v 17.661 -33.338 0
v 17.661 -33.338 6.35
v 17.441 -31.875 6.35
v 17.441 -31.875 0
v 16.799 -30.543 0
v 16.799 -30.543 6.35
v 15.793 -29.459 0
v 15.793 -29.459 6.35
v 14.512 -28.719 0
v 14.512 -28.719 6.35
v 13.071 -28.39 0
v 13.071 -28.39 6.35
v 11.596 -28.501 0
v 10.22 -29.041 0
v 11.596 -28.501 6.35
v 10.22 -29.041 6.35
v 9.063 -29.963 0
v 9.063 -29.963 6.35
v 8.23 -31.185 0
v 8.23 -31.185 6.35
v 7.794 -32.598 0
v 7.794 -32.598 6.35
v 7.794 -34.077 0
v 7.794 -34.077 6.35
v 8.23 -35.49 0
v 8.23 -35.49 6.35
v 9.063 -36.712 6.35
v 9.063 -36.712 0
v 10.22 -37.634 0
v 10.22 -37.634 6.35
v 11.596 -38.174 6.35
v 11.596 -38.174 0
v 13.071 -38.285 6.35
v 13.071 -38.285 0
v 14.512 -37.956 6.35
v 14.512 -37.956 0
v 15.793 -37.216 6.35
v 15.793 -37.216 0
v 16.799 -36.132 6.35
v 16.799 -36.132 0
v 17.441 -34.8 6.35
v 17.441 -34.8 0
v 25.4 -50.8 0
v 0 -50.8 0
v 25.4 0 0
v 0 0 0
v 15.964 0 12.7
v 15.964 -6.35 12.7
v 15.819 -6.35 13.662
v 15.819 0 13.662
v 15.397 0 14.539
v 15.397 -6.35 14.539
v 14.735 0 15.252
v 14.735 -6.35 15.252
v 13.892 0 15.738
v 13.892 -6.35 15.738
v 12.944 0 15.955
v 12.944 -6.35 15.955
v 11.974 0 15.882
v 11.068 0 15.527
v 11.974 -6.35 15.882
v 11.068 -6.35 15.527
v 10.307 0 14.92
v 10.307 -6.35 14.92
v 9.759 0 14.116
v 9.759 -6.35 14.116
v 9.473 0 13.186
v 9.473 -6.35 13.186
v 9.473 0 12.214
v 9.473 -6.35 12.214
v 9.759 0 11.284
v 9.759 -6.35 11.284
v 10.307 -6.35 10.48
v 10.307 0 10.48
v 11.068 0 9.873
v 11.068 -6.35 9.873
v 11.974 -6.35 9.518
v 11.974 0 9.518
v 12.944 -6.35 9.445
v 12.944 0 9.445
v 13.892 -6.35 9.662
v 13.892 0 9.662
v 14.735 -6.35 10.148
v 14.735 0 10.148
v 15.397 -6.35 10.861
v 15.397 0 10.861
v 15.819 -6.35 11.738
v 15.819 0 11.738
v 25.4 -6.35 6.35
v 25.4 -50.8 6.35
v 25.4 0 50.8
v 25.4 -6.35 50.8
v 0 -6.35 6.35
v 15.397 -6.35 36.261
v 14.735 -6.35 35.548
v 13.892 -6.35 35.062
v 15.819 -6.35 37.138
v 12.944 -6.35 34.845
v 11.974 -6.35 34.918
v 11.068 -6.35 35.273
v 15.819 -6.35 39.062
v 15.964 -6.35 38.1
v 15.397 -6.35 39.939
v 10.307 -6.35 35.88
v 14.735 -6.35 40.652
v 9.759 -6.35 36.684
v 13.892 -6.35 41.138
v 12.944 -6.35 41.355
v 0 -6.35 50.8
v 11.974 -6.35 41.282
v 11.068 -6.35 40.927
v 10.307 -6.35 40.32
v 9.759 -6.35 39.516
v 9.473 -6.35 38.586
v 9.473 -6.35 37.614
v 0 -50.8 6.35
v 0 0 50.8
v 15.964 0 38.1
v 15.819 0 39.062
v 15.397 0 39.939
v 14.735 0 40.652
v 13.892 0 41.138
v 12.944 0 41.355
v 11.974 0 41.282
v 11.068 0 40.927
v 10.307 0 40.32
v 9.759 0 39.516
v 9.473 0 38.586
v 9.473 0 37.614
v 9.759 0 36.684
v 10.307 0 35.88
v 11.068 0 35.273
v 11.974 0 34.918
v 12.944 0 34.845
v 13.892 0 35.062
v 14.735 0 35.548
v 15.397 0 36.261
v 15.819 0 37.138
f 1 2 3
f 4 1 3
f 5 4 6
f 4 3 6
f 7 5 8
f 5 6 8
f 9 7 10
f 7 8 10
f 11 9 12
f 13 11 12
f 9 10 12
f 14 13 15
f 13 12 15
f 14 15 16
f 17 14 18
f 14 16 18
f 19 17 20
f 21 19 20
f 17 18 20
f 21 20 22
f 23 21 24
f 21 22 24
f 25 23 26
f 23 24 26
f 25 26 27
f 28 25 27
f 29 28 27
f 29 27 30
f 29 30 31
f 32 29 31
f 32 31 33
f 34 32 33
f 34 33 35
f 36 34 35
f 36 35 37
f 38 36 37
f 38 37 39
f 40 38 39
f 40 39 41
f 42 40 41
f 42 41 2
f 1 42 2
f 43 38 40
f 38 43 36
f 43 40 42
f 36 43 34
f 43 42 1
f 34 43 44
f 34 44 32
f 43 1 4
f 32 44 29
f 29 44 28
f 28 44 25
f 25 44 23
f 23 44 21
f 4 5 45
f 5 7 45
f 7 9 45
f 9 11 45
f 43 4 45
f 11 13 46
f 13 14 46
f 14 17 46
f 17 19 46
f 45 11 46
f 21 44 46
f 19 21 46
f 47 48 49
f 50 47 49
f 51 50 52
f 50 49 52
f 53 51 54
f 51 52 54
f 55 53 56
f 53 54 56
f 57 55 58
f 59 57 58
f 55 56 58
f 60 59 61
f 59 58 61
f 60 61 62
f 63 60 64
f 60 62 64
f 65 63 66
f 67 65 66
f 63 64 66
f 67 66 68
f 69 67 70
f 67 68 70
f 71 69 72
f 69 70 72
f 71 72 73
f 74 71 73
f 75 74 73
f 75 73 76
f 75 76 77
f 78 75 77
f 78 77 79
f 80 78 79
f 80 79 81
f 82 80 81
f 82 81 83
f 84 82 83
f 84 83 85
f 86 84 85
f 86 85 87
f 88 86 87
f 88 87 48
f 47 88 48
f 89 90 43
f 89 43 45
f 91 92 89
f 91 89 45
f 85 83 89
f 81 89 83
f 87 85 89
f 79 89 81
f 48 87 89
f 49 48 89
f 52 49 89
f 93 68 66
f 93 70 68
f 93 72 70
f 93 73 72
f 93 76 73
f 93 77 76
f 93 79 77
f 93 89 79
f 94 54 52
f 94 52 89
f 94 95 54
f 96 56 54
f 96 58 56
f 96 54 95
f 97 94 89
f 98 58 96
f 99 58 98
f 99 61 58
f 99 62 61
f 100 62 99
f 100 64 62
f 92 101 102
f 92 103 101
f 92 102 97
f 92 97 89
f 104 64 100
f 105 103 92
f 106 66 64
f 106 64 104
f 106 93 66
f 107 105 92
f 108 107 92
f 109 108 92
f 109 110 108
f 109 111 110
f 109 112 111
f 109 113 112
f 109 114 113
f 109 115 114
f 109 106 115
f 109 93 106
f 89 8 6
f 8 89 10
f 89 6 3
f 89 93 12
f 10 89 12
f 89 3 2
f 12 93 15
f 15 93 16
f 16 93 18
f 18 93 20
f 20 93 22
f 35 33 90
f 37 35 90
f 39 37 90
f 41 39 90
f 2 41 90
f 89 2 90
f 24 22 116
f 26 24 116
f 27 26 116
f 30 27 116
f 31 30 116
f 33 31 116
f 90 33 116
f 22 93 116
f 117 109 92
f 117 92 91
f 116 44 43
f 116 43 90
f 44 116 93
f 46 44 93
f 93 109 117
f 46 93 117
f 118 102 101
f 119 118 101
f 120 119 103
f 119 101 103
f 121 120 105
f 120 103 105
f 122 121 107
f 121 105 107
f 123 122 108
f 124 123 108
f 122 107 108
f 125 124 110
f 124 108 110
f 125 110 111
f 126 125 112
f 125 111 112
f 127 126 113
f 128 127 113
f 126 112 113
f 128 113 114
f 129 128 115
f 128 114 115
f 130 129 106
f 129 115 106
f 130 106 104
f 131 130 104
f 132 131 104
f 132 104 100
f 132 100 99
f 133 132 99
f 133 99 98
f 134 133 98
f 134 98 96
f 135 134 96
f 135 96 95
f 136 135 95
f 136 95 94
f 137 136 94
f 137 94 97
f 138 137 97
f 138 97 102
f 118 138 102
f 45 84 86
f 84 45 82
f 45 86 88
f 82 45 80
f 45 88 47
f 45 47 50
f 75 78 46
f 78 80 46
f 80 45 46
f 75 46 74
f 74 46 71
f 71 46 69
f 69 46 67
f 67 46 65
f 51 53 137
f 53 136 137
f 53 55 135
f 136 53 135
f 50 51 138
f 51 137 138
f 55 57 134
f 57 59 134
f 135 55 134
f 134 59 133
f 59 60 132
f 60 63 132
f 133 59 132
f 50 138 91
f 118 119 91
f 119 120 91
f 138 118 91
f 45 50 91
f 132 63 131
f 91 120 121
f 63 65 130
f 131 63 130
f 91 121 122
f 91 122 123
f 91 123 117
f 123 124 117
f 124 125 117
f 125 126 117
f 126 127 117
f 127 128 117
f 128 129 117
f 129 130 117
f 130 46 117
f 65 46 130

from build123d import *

# Parameters (mm, degrees)
F0_W     = 44.45
F0_H     = 6.35
F0_W_2   = 6.35
F0_H_2   = 44.45
F1_DEPTH = 25.4
F2_R     = 4.960938
F3_DEPTH = 25.4
F5_R     = 3.2639
F6_DEPTH = 25.4


with BuildPart() as f1:
    # F0 (on Right) → F1 (new body)
    with BuildSketch(Plane.YZ):
        with Locations((-28.575, 3.175)):
            Rectangle(F0_W, F0_H)
        with Locations((-3.175, 3.175)):
            Rectangle(F0_W_2, F0_H)
        with Locations((-3.175, 28.575)):
            Rectangle(F0_W_2, F0_H_2)
    extrude(amount=F1_DEPTH)

    # F2 (on face) → F3 (cut)
    with BuildSketch(Plane.XY.offset(6.35)):
        with Locations((12.7, -33.3375)):
            Circle(F2_R)
    extrude(amount=-F3_DEPTH, mode=Mode.SUBTRACT)

    # F5 (on face) → F6 (cut)
    with BuildSketch(Plane.XZ.offset(6.35)):
        with Locations((12.7, 12.7)):
            Circle(F5_R)
        with Locations((12.7, 38.1)):
            Circle(F5_R)
    extrude(amount=-F6_DEPTH, mode=Mode.SUBTRACT)


solid = f1.part
